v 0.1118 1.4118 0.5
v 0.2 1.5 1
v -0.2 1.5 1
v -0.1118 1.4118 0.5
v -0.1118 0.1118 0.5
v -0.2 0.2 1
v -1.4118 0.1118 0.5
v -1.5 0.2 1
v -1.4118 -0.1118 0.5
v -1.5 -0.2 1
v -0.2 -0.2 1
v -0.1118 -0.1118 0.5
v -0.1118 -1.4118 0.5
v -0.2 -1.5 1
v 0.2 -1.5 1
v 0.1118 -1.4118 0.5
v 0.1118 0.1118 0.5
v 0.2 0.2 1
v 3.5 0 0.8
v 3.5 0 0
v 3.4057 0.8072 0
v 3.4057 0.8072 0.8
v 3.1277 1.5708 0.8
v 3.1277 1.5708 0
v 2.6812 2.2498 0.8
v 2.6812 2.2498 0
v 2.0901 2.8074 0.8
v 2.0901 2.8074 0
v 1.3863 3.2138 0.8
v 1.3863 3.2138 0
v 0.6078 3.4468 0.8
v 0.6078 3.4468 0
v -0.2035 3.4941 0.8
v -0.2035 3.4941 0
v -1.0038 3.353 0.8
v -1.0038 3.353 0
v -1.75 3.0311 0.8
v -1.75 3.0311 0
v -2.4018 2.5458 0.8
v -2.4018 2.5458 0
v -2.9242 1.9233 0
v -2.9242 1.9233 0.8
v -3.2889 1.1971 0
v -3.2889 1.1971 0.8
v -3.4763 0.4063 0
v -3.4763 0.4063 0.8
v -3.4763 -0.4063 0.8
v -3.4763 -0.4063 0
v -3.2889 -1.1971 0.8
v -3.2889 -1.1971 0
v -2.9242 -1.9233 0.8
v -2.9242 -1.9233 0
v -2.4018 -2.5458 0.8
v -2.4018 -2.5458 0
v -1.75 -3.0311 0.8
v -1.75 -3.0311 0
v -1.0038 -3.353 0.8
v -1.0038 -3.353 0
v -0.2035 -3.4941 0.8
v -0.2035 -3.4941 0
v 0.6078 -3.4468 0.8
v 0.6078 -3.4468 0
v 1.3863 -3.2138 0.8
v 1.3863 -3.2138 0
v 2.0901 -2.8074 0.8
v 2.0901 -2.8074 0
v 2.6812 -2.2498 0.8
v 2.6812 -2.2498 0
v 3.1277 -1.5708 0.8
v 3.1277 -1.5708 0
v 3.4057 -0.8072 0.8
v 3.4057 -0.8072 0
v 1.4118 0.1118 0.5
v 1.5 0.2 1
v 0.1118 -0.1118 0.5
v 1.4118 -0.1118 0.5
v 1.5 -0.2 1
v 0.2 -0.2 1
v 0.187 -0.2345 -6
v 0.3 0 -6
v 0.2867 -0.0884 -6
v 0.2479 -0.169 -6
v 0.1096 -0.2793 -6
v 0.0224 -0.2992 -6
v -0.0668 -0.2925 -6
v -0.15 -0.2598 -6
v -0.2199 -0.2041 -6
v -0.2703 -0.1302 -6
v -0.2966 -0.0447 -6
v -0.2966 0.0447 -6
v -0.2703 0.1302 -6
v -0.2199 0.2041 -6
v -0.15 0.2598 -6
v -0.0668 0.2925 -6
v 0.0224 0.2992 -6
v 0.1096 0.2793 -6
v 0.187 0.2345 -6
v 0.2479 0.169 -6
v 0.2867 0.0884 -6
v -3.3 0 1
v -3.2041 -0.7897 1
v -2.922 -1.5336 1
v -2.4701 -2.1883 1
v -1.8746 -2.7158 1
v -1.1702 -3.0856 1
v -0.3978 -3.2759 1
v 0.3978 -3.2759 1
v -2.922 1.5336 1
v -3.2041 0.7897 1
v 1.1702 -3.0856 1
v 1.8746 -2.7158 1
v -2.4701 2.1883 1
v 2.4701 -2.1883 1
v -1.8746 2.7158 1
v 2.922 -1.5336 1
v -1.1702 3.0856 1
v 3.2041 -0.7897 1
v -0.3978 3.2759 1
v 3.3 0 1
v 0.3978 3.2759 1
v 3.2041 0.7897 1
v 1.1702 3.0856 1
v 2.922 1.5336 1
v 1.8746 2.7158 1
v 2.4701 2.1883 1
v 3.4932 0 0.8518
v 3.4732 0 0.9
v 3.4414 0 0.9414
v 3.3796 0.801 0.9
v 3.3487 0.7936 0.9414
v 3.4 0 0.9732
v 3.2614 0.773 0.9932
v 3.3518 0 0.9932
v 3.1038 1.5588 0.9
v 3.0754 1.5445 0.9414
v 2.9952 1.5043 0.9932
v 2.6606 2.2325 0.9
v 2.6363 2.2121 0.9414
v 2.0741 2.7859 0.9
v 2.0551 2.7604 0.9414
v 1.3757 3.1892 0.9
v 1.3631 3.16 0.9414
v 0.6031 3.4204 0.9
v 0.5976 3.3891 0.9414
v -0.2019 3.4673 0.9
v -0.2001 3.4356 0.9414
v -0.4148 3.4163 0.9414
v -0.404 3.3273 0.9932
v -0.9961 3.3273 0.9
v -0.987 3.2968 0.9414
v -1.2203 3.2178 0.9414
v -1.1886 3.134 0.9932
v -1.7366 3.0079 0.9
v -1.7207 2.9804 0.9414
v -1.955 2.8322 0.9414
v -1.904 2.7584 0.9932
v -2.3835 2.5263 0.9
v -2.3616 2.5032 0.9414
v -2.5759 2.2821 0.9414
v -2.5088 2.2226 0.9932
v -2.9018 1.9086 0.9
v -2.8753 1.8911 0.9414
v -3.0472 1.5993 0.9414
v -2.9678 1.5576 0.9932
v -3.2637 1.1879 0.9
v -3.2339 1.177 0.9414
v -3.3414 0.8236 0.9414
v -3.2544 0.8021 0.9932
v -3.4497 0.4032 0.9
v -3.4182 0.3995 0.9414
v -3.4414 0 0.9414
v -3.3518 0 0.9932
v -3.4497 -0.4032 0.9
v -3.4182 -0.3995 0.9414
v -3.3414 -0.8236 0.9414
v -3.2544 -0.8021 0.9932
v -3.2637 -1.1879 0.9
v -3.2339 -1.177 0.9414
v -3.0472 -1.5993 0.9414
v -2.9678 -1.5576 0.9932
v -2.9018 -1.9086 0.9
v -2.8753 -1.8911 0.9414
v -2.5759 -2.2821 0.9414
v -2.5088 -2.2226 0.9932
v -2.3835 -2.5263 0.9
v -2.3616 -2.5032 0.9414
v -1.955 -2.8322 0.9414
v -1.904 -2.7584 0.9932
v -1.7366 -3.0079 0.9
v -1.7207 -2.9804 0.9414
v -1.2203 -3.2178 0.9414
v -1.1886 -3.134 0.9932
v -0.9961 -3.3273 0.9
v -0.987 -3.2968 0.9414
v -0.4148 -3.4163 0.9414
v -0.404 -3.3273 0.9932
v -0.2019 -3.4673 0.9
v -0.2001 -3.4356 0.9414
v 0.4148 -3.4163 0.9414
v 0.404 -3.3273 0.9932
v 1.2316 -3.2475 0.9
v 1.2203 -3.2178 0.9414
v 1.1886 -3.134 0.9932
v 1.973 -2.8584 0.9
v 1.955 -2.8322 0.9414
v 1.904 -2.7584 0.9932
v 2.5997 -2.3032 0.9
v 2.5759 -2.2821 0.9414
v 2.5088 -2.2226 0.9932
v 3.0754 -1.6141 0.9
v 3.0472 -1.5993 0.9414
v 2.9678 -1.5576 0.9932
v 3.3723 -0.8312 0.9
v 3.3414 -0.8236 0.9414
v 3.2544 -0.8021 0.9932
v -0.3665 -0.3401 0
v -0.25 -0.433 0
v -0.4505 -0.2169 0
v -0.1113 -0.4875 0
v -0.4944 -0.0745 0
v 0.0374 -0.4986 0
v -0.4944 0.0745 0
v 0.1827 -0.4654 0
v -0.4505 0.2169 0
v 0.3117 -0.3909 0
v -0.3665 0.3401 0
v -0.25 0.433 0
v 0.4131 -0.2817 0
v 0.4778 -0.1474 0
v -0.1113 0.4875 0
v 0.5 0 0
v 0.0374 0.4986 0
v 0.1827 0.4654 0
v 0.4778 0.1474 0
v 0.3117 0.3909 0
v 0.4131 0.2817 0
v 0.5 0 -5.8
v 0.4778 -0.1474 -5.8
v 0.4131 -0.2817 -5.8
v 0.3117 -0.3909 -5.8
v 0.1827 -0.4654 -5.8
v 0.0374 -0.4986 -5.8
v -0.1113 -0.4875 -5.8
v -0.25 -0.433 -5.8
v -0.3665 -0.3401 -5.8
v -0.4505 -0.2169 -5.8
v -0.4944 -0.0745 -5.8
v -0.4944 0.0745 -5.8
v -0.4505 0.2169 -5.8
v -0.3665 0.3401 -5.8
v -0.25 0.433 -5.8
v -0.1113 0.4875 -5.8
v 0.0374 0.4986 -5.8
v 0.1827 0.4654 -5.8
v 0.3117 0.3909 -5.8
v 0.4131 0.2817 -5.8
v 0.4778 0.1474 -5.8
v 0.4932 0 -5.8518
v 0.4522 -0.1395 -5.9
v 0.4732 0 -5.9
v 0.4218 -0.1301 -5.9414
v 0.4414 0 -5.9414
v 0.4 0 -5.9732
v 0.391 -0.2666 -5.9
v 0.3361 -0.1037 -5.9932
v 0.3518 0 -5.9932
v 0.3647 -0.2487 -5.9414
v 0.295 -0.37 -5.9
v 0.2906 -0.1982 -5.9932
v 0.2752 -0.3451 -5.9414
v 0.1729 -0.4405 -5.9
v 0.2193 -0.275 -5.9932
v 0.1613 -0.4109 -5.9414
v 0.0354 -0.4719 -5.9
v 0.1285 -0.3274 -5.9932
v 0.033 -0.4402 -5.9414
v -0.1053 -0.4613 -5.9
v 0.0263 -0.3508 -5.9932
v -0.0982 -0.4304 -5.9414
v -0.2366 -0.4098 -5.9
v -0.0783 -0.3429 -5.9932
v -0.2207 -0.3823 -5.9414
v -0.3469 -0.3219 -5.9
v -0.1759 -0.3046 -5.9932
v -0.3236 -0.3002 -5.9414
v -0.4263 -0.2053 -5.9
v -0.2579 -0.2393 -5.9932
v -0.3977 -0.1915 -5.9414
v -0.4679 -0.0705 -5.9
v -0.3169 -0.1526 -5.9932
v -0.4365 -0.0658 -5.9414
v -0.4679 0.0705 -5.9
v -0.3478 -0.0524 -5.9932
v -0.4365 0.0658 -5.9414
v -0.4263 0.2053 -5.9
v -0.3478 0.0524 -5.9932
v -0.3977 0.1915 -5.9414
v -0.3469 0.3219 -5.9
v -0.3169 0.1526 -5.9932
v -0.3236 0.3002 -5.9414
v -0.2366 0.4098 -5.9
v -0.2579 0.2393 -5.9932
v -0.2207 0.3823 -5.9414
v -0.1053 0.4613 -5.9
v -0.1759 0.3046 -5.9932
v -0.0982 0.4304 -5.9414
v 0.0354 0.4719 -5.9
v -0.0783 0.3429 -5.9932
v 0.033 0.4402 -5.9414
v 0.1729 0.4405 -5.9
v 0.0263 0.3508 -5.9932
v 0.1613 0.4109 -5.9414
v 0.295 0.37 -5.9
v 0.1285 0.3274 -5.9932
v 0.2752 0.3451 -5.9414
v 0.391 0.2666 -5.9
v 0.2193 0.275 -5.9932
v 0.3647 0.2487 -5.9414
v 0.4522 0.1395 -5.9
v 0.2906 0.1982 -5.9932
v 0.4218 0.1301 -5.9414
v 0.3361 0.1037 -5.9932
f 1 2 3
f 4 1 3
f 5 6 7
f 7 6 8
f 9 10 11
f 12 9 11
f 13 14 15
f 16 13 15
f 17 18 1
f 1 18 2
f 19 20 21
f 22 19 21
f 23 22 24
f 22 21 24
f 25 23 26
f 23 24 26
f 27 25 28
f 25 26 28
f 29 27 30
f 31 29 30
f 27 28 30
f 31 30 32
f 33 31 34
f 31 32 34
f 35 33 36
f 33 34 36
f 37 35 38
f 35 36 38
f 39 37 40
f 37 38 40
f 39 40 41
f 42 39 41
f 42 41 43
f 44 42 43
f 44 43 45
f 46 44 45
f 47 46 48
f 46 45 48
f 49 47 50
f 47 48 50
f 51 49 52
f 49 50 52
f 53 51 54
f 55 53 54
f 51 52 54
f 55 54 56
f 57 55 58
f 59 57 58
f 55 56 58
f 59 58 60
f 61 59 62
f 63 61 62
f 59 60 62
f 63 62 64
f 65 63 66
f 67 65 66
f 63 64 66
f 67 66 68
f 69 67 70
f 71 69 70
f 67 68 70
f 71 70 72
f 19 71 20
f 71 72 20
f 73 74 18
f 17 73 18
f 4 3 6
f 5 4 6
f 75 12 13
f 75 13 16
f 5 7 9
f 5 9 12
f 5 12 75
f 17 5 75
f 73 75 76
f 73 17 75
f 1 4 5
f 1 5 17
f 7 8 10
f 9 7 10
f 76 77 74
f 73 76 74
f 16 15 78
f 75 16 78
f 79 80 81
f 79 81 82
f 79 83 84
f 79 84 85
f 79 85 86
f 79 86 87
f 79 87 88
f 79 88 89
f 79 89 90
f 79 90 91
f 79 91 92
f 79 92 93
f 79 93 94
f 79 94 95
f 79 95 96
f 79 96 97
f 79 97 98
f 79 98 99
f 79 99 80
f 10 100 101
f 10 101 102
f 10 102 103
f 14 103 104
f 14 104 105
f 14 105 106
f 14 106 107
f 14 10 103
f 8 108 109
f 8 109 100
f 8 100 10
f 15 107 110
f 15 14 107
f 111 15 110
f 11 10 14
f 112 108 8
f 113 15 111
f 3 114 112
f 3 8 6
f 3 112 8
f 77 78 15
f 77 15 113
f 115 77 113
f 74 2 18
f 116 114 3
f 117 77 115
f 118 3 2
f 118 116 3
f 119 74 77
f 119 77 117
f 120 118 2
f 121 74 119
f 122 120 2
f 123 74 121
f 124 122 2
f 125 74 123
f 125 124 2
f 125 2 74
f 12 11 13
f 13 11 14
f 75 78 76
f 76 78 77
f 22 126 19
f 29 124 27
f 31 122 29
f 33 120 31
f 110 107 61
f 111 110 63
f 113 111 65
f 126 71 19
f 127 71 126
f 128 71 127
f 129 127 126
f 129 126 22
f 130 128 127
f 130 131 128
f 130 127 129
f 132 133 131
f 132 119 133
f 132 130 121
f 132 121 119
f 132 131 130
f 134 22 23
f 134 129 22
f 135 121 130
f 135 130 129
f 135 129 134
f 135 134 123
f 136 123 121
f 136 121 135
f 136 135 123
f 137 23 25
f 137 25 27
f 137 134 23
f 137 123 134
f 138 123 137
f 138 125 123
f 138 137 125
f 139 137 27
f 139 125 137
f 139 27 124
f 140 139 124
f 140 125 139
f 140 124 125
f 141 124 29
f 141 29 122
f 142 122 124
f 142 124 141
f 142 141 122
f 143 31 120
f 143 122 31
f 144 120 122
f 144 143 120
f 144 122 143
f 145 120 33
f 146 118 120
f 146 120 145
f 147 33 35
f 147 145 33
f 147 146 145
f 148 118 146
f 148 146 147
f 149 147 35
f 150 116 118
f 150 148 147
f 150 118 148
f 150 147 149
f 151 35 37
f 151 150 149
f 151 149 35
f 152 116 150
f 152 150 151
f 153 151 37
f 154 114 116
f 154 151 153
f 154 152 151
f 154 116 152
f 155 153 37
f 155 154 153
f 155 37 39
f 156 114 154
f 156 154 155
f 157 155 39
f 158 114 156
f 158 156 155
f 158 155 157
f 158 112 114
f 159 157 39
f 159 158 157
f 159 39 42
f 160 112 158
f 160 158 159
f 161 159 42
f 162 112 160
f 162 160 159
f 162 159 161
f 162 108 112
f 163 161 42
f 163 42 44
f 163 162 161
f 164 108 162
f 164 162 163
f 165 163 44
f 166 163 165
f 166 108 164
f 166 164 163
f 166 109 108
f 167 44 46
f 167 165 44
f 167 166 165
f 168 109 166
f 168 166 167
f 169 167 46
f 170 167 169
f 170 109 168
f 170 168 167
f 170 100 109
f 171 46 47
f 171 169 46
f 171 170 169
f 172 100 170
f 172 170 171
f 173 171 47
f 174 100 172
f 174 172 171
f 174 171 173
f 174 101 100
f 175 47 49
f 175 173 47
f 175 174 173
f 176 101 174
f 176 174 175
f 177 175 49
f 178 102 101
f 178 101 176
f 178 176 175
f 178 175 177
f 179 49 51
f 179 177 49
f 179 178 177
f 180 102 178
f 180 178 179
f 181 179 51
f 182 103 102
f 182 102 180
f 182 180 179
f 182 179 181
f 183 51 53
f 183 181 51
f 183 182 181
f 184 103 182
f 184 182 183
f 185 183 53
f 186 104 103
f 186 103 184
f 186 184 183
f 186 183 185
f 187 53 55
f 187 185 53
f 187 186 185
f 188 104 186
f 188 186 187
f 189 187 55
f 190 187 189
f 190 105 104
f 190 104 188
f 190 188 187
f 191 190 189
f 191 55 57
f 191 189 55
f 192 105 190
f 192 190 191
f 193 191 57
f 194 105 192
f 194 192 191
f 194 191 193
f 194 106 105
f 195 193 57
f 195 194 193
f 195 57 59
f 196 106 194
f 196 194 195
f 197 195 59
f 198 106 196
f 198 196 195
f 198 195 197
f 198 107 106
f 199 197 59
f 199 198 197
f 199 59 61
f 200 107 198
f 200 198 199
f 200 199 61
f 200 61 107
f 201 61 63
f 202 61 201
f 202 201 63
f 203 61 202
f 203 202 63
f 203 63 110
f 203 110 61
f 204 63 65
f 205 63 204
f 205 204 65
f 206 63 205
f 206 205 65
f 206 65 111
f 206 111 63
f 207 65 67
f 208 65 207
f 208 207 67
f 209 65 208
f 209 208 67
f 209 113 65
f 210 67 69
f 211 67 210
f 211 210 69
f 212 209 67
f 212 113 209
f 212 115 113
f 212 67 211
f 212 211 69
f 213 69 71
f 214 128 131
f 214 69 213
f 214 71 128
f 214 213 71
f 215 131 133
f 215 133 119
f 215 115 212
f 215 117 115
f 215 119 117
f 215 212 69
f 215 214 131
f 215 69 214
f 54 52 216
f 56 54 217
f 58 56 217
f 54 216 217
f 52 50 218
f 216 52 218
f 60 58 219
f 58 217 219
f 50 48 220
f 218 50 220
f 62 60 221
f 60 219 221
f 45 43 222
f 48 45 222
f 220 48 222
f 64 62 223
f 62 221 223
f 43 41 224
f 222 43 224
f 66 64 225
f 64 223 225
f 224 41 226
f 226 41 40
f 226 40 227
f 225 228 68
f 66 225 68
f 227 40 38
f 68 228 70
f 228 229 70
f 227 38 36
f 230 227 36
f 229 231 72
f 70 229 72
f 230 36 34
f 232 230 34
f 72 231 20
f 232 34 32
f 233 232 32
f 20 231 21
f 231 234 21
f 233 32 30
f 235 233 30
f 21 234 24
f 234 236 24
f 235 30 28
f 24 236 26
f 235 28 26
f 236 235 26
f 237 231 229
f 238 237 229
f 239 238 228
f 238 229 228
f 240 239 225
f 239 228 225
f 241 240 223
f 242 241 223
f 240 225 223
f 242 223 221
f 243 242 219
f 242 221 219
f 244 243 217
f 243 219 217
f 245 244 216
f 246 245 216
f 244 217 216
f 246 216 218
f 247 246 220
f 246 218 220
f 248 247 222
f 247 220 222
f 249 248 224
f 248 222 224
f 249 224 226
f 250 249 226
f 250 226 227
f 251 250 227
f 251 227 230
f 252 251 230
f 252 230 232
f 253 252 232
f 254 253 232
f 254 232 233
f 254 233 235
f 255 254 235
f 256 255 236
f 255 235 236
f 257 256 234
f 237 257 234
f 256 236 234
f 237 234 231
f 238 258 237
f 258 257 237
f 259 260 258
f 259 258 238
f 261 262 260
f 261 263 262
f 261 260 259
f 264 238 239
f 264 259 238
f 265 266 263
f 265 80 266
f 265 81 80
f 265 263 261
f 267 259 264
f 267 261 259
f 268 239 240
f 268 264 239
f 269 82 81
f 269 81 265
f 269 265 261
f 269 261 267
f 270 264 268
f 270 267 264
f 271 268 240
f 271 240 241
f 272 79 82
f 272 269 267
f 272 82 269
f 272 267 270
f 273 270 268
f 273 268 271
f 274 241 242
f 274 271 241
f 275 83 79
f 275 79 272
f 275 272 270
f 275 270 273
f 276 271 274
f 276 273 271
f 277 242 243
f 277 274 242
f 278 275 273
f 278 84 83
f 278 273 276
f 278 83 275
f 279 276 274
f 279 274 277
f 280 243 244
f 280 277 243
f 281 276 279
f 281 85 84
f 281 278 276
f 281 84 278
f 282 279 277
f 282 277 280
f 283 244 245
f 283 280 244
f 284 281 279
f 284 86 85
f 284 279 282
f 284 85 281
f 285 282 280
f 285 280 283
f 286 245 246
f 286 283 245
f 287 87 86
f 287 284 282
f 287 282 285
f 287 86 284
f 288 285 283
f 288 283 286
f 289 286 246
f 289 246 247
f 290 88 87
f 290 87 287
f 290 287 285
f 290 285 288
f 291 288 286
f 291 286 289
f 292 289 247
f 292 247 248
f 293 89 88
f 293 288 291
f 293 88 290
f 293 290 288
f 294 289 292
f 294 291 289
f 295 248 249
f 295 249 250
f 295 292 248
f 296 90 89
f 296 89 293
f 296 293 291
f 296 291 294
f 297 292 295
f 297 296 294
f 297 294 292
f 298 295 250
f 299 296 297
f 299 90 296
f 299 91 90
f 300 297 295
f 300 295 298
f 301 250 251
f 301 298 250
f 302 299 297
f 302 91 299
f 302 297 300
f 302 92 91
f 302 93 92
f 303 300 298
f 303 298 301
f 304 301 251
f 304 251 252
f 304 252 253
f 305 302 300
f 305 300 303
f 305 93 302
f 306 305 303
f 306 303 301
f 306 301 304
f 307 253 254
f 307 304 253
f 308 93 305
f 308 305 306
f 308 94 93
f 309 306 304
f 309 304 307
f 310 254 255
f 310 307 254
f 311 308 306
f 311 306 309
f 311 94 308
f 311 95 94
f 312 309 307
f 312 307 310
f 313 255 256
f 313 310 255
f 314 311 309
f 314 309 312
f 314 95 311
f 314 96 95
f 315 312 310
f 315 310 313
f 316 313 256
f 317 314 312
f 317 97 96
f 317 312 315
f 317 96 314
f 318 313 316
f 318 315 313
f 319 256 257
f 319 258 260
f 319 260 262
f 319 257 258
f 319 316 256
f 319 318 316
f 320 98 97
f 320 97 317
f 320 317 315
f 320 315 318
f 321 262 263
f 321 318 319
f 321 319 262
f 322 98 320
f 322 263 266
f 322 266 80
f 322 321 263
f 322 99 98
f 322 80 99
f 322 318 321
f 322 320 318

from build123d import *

# Parameters (mm, degrees)
SKETCH1_R           = 3.5
BOSS_EXTRUDE1_DEPTH = 1
SKETCH2_R           = 0.5
BOSS_EXTRUDE2_DEPTH = 6
FILLET1_R           = 0.2
CUT_EXTRUDE1_DEPTH  = 0.5
CUT_EXTRUDE1_DRAFT  = -10
FILLET2_R           = 0.2


with BuildPart() as part:
    # Sketch1 → Boss-Extrude1 (new body)
    with BuildSketch(Plane.XY):
        Circle(SKETCH1_R)
    extrude(amount=BOSS_EXTRUDE1_DEPTH)

    # Sketch2 → Boss-Extrude2 (add)
    with BuildSketch(Plane(origin=(0, 0, 0), x_dir=(-1, 0, 0), z_dir=(0, 0, -1))):
        with Locations(Location((0, 0, 0), (0, 0, 180))):
            Circle(SKETCH2_R)
    extrude(amount=BOSS_EXTRUDE2_DEPTH)

    # Fillet1
    fillet1_edges = [part.edges().sort_by_distance(p)[0] for p in [
        (-3.5, 0, 1),
    ]]
    fillet(fillet1_edges, radius=FILLET1_R)


with BuildPart() as cut_extrude1_tool:
    # Sketch3 → Cut-Extrude1 (with draft: the straight prism first)
    with BuildSketch(Plane.XY.offset(1)):
        Polygon((-0.2, -0.2), (-0.2, -1.5), (0.2, -1.5), (0.2, -0.2), (1.5, -0.2), (1.5, 0.2), (0.2, 0.2), (0.2, 1.5), (-0.2, 1.5), (-0.2, 0.2), (-1.5, 0.2), (-1.5, -0.2), align=None)
    extrude(amount=-CUT_EXTRUDE1_DEPTH)
    # Cut-Extrude1: the draft: its side faces are tilted about the plane it starts from
    cut_extrude1_sides = [cut_extrude1_tool.faces().sort_by_distance(p)[0] for p in [
        (-0.2, -0.85, 0.75),
        (0, -1.5, 0.75),
        (0.2, -0.85, 0.75),
        (0.85, -0.2, 0.75),
        (1.5, 0, 0.75),
        (0.85, 0.2, 0.75),
        (0.2, 0.85, 0.75),
        (0, 1.5, 0.75),
        (-0.2, 0.85, 0.75),
        (-0.85, 0.2, 0.75),
        (-1.5, 0, 0.75),
        (-0.85, -0.2, 0.75),
    ]]
    draft(cut_extrude1_sides, Plane.XY.offset(1), CUT_EXTRUDE1_DRAFT)


with BuildPart() as part_1:
    add(part.part)

    # Cut-Extrude1: cut by cut_extrude1_tool
    add(cut_extrude1_tool.part, mode=Mode.SUBTRACT)

    # Fillet2
    fillet2_edges = [part_1.edges().sort_by_distance(p)[0] for p in [
        (-0.5, 0, -6),
    ]]
    fillet(fillet2_edges, radius=FILLET2_R)


solid = part_1.part
